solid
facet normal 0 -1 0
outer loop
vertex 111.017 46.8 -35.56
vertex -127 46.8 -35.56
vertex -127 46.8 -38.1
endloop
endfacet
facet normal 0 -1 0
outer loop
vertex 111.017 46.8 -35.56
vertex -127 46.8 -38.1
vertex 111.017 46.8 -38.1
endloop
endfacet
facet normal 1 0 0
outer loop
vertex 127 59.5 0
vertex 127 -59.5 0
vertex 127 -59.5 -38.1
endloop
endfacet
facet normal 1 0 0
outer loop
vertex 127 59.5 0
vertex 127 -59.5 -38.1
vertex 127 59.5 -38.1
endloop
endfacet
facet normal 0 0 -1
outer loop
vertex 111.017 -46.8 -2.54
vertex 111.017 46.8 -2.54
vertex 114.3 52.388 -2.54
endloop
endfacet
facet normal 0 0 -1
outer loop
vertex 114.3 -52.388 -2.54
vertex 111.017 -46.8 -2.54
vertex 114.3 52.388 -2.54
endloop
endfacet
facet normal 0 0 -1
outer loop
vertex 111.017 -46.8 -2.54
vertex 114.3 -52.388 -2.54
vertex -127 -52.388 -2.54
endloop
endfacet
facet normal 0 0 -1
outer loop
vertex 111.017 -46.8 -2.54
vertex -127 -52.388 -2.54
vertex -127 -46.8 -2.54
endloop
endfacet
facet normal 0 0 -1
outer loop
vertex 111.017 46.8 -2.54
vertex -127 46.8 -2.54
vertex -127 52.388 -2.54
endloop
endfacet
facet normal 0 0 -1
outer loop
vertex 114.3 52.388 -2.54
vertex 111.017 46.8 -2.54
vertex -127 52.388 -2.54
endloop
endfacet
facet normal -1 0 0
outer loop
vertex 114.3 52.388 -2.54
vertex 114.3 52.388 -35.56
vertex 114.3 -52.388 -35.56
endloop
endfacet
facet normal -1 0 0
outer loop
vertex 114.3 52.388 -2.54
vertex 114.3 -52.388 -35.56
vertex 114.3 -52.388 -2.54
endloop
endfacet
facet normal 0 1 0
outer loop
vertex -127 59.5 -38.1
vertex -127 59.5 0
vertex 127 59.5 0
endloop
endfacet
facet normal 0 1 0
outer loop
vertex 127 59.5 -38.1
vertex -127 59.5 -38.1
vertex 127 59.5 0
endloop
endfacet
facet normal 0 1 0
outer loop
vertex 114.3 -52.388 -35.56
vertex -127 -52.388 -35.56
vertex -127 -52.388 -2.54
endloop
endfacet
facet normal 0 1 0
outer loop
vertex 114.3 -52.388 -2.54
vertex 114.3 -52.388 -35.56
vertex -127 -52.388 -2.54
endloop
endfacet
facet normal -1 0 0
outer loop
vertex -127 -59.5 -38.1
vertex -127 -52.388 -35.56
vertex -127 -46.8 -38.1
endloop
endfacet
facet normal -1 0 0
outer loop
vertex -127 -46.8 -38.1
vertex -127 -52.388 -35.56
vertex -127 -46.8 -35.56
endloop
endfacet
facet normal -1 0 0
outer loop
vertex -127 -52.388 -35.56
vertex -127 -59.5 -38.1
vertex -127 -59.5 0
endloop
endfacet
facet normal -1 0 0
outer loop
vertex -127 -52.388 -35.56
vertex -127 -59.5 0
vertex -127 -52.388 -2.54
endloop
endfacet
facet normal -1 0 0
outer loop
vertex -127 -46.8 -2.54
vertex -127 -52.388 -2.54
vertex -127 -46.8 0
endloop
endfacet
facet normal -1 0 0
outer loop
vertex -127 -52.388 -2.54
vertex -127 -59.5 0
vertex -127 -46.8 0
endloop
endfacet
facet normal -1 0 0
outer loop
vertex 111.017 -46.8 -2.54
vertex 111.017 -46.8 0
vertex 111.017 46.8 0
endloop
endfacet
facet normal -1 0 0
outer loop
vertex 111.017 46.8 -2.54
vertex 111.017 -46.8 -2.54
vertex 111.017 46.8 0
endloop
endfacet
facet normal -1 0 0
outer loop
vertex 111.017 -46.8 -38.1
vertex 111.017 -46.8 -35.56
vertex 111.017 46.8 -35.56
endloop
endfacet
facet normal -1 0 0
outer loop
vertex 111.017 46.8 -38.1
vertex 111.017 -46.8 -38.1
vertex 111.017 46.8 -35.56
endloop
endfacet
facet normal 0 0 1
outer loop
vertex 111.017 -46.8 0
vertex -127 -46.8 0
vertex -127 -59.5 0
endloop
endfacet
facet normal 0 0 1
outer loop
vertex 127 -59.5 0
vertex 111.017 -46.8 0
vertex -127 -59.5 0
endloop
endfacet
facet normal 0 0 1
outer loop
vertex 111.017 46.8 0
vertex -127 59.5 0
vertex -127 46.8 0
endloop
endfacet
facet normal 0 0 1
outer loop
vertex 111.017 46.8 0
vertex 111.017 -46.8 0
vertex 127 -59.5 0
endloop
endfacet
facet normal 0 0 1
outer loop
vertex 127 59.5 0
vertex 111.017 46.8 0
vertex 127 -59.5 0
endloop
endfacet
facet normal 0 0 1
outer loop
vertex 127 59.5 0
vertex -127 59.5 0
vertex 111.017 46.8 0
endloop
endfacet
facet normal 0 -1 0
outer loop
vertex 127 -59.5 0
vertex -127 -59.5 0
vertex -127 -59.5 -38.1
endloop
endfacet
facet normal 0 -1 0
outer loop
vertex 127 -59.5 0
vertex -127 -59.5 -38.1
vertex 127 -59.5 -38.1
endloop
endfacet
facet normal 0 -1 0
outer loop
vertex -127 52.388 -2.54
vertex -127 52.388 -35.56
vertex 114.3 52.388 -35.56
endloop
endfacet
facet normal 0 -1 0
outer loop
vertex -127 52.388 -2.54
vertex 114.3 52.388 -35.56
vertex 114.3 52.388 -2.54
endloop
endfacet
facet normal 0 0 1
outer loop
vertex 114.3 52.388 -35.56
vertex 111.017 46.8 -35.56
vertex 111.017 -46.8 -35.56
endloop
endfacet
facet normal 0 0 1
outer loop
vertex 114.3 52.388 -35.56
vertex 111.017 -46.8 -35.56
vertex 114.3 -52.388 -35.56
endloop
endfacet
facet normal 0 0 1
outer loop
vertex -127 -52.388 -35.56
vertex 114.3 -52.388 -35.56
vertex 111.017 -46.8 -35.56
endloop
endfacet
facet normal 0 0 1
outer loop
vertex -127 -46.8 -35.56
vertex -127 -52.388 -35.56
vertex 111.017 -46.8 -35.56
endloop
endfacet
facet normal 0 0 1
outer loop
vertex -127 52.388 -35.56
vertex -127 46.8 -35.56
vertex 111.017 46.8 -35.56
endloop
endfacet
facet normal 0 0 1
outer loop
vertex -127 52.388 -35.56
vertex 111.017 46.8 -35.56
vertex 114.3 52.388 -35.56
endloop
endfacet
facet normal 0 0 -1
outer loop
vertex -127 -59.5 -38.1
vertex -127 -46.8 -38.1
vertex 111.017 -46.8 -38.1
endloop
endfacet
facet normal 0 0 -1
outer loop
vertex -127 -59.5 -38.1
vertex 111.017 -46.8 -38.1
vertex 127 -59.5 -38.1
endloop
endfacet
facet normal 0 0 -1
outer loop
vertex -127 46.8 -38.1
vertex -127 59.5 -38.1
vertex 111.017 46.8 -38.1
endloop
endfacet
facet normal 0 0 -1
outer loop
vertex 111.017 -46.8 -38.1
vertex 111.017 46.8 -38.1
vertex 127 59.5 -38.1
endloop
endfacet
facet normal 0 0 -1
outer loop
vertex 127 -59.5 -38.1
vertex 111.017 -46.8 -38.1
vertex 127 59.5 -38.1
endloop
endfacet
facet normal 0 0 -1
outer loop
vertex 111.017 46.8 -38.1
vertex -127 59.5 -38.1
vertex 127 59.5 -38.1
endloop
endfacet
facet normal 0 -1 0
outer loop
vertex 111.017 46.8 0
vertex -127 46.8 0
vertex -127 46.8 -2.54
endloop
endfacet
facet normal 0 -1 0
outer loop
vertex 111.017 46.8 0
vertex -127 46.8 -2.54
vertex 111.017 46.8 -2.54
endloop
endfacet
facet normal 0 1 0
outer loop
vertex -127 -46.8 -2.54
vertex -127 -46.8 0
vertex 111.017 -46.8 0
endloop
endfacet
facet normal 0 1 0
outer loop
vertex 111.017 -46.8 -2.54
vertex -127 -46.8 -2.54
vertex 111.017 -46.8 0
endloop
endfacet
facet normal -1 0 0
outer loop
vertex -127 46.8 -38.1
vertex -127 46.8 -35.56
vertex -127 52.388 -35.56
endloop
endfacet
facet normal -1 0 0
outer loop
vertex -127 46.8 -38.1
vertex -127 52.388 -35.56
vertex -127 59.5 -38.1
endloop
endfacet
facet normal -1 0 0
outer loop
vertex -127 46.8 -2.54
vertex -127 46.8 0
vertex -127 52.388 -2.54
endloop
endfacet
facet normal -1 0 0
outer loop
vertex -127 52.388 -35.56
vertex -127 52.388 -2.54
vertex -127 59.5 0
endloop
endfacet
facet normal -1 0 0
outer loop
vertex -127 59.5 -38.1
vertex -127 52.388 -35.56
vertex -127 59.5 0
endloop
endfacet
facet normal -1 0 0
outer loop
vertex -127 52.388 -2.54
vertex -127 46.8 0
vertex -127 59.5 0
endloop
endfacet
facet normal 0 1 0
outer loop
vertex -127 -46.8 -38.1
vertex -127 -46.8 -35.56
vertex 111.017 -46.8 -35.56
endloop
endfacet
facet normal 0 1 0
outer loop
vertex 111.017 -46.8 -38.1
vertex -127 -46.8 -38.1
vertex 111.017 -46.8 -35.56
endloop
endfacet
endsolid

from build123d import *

# Parameters (mm, degrees)
SKETCH1_W           = 254
SKETCH1_H           = 118.999
BOSS_EXTRUDE1_DEPTH = 38.1
SKETCH2_W           = 33.02
SKETCH2_H           = 104.775
CUT_EXTRUDE1_DEPTH  = 241.3
SKETCH5_W           = 238.017311759
SKETCH5_H           = 93.599
CUT_EXTRUDE2_DEPTH  = 38.354


with BuildPart() as part:
    # Sketch1 → Boss-Extrude1 (new body)
    with BuildSketch(Plane.XY):
        Rectangle(SKETCH1_W, SKETCH1_H)
    extrude(amount=-BOSS_EXTRUDE1_DEPTH)

    # Sketch2 → Cut-Extrude1 (cut)
    with BuildSketch(Plane.ZY.offset(127)):
        with Locations((-19.05, 0)):
            Rectangle(SKETCH2_W, SKETCH2_H)
    extrude(amount=-CUT_EXTRUDE1_DEPTH, mode=Mode.SUBTRACT)

    # Sketch5 → Cut-Extrude2 (cut)
    with BuildSketch(Plane.XY):
        with Locations((-7.991344121, 0)):
            Rectangle(SKETCH5_W, SKETCH5_H)
    extrude(amount=-CUT_EXTRUDE2_DEPTH, mode=Mode.SUBTRACT)


solid = part.part
